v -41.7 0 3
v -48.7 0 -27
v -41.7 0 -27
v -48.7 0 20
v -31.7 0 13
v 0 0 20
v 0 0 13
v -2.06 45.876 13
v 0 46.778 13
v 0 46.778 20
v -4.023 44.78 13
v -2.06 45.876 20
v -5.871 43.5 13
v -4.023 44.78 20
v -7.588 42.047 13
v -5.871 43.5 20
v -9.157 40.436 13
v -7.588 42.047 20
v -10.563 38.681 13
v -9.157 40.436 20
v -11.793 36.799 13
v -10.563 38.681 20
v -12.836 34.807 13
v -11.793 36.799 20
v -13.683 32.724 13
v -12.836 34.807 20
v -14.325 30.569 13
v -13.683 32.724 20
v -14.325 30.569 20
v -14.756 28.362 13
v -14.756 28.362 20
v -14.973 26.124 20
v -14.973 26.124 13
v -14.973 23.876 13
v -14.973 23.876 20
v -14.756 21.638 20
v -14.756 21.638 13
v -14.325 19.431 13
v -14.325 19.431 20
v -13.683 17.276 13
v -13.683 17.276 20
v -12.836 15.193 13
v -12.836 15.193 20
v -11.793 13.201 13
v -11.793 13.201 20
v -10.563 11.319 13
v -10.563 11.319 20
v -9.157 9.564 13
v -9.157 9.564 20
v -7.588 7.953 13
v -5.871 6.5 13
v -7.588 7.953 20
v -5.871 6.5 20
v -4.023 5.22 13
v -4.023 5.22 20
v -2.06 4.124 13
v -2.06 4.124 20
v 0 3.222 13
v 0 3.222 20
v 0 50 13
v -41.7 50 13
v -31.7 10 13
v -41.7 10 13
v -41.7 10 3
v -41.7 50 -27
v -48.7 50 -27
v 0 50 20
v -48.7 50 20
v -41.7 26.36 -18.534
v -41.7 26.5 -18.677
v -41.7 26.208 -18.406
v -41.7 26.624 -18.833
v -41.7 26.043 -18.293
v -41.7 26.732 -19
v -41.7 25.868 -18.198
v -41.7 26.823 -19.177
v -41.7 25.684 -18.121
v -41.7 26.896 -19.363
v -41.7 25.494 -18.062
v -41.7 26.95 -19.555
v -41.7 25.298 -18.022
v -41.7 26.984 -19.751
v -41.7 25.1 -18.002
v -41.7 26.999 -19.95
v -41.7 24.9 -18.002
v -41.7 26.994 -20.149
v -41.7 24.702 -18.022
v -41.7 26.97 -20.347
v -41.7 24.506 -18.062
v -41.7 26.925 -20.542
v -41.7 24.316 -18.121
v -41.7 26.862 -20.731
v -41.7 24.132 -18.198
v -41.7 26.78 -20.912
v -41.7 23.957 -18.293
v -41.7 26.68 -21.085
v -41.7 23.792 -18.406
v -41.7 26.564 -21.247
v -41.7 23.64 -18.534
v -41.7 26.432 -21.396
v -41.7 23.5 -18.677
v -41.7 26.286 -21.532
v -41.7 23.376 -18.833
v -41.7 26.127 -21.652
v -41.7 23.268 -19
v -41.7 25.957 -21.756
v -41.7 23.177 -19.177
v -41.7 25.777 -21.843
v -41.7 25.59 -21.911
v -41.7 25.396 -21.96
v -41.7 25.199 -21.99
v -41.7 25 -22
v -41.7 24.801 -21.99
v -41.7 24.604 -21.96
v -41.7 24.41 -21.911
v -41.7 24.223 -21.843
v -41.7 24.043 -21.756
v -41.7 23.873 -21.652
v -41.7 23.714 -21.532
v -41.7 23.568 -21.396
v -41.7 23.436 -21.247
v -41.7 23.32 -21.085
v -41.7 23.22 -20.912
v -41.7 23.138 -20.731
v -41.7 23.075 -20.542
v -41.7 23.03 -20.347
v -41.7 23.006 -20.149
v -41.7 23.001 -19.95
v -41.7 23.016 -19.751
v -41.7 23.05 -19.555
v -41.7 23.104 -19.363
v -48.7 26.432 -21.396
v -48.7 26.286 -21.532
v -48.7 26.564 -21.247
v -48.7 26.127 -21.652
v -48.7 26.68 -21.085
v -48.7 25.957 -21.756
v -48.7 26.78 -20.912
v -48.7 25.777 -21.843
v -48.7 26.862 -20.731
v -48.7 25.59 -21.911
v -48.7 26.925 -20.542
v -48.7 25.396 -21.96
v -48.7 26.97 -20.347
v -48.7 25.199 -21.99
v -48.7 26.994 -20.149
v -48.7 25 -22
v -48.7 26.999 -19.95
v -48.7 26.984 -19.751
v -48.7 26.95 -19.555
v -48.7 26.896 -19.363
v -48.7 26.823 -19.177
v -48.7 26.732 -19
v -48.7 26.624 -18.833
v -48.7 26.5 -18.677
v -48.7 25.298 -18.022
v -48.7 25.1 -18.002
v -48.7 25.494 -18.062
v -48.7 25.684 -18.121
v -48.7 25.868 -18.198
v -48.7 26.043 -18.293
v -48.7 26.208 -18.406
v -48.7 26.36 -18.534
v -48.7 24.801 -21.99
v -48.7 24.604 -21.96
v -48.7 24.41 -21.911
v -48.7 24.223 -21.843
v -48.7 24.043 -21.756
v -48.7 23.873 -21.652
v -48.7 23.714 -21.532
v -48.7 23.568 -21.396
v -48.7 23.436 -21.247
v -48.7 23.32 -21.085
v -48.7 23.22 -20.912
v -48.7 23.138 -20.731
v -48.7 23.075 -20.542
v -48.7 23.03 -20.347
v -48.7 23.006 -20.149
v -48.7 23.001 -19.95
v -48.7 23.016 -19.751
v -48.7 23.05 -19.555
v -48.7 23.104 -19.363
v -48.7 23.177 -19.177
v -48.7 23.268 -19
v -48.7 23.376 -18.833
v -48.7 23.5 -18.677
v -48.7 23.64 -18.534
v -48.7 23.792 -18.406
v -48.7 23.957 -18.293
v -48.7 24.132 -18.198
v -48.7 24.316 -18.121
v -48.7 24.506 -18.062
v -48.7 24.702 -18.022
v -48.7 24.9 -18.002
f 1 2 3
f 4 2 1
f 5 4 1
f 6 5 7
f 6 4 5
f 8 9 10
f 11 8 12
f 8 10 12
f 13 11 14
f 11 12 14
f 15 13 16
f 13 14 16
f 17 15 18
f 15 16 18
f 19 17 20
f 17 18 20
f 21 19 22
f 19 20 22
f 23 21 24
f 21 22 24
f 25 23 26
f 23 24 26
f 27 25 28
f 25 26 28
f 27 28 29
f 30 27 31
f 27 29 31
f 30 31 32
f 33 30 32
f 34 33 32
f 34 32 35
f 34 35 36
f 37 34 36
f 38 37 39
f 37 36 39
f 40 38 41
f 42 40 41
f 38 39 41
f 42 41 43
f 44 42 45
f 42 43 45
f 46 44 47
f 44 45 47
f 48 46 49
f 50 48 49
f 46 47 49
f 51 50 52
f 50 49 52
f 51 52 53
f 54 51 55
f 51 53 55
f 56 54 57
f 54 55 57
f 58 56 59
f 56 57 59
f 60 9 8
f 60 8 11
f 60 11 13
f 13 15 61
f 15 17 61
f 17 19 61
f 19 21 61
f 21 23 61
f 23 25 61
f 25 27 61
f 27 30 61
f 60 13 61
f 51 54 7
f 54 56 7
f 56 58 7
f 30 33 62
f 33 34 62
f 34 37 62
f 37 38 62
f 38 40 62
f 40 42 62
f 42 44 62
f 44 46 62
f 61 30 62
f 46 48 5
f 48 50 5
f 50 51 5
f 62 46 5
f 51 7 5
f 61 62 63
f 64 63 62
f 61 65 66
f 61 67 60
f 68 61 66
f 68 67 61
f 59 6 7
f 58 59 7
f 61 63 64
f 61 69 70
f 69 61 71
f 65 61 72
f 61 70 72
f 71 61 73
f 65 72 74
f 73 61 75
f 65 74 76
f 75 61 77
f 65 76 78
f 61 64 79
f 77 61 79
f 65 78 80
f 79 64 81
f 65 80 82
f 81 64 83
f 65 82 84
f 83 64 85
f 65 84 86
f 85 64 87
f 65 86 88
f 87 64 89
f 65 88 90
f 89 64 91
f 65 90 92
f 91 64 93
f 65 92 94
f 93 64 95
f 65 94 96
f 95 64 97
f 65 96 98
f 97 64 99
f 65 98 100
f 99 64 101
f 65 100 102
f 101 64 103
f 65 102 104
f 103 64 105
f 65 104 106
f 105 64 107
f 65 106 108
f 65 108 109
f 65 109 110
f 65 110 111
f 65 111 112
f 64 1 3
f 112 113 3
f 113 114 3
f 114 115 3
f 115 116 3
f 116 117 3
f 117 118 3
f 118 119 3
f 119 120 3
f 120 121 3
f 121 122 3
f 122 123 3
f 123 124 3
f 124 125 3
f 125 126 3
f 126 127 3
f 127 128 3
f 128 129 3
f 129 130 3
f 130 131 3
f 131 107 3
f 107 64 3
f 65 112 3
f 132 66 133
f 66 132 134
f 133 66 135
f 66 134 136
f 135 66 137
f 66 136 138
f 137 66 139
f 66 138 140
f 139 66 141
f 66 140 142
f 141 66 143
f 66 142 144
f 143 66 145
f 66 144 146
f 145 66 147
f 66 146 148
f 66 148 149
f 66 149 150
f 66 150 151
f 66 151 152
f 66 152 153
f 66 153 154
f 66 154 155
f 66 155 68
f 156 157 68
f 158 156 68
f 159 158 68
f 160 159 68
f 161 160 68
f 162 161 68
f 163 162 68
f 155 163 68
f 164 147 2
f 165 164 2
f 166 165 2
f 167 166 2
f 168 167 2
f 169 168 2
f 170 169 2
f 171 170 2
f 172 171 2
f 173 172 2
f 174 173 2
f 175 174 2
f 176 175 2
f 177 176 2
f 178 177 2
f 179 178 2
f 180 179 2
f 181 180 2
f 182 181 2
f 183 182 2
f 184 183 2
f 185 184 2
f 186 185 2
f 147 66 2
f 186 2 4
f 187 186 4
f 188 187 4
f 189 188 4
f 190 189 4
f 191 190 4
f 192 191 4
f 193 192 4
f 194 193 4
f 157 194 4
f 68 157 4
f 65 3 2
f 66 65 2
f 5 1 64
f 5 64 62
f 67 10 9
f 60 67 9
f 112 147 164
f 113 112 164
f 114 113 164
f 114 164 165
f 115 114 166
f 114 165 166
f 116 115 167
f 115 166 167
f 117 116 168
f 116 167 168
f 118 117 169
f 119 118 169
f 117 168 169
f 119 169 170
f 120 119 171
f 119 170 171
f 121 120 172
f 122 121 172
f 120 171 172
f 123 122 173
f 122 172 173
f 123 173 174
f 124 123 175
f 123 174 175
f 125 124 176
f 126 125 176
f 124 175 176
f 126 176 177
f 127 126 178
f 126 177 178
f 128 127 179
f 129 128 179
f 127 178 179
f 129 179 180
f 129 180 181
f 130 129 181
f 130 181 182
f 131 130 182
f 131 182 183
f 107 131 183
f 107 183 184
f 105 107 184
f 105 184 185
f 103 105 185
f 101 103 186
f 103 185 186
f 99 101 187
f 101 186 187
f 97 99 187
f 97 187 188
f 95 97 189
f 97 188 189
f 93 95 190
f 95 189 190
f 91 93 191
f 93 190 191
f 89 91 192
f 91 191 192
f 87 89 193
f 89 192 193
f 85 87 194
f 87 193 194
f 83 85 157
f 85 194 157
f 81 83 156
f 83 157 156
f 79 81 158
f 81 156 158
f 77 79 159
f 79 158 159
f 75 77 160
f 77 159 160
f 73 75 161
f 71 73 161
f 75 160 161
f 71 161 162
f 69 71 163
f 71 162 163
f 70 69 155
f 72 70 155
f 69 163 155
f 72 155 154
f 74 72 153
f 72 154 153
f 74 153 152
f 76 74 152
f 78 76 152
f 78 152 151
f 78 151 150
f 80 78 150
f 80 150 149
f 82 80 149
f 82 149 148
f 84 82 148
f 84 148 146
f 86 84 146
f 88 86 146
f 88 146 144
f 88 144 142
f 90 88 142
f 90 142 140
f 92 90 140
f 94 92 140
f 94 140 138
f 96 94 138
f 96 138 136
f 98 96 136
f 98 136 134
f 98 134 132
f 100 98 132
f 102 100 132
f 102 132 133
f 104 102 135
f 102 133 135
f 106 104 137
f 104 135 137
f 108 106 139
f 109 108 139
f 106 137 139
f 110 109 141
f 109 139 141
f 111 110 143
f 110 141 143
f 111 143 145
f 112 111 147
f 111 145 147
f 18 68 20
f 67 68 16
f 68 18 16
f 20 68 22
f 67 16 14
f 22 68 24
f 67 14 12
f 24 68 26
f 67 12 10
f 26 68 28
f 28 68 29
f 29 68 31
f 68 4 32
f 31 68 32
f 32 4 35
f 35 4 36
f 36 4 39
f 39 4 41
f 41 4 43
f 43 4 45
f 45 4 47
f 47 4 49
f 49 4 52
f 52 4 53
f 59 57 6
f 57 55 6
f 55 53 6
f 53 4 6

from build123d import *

# Parameters (mm, degrees)
PAD_DEPTH       = 50
SKETCH001_R     = 23.31
POCKET_DEPTH    = 7
SKETCH002_R     = 2
POCKET001_DEPTH = 7
PAD001_DEPTH    = 10


with BuildPart() as part:
    # Sketch → Pad (new body)
    with BuildSketch(Plane.XZ):
        Polygon((-41.7, -27), (-48.7, -27), (-48.7, 20), (0, 20), (0, 13), (-41.7, 13), align=None)
    extrude(amount=-PAD_DEPTH)

    # Sketch001 → Pocket (cut)
    with BuildSketch(Plane(origin=(0, 0, 20), x_dir=(-1, 0, 0), z_dir=(0, 0, 1))):
        with Locations((-8.31, -25)):
            Circle(SKETCH001_R)
    extrude(amount=-POCKET_DEPTH, mode=Mode.SUBTRACT)

    # Sketch002 → Pocket001 (cut)
    with BuildSketch(Plane(origin=(-48.7, 0, 0), x_dir=(0, 0, -1), z_dir=(-1, 0, 0))):
        with Locations((20, -25)):
            Circle(SKETCH002_R)
    extrude(amount=-POCKET001_DEPTH, mode=Mode.SUBTRACT)

    # Sketch003 → Pad001 (new body)
    with BuildSketch(Plane.XZ):
        Polygon((-41.7, 13), (-41.7, 3), (-31.7, 13), align=None)
    extrude(amount=-PAD001_DEPTH)


solid = part.part
